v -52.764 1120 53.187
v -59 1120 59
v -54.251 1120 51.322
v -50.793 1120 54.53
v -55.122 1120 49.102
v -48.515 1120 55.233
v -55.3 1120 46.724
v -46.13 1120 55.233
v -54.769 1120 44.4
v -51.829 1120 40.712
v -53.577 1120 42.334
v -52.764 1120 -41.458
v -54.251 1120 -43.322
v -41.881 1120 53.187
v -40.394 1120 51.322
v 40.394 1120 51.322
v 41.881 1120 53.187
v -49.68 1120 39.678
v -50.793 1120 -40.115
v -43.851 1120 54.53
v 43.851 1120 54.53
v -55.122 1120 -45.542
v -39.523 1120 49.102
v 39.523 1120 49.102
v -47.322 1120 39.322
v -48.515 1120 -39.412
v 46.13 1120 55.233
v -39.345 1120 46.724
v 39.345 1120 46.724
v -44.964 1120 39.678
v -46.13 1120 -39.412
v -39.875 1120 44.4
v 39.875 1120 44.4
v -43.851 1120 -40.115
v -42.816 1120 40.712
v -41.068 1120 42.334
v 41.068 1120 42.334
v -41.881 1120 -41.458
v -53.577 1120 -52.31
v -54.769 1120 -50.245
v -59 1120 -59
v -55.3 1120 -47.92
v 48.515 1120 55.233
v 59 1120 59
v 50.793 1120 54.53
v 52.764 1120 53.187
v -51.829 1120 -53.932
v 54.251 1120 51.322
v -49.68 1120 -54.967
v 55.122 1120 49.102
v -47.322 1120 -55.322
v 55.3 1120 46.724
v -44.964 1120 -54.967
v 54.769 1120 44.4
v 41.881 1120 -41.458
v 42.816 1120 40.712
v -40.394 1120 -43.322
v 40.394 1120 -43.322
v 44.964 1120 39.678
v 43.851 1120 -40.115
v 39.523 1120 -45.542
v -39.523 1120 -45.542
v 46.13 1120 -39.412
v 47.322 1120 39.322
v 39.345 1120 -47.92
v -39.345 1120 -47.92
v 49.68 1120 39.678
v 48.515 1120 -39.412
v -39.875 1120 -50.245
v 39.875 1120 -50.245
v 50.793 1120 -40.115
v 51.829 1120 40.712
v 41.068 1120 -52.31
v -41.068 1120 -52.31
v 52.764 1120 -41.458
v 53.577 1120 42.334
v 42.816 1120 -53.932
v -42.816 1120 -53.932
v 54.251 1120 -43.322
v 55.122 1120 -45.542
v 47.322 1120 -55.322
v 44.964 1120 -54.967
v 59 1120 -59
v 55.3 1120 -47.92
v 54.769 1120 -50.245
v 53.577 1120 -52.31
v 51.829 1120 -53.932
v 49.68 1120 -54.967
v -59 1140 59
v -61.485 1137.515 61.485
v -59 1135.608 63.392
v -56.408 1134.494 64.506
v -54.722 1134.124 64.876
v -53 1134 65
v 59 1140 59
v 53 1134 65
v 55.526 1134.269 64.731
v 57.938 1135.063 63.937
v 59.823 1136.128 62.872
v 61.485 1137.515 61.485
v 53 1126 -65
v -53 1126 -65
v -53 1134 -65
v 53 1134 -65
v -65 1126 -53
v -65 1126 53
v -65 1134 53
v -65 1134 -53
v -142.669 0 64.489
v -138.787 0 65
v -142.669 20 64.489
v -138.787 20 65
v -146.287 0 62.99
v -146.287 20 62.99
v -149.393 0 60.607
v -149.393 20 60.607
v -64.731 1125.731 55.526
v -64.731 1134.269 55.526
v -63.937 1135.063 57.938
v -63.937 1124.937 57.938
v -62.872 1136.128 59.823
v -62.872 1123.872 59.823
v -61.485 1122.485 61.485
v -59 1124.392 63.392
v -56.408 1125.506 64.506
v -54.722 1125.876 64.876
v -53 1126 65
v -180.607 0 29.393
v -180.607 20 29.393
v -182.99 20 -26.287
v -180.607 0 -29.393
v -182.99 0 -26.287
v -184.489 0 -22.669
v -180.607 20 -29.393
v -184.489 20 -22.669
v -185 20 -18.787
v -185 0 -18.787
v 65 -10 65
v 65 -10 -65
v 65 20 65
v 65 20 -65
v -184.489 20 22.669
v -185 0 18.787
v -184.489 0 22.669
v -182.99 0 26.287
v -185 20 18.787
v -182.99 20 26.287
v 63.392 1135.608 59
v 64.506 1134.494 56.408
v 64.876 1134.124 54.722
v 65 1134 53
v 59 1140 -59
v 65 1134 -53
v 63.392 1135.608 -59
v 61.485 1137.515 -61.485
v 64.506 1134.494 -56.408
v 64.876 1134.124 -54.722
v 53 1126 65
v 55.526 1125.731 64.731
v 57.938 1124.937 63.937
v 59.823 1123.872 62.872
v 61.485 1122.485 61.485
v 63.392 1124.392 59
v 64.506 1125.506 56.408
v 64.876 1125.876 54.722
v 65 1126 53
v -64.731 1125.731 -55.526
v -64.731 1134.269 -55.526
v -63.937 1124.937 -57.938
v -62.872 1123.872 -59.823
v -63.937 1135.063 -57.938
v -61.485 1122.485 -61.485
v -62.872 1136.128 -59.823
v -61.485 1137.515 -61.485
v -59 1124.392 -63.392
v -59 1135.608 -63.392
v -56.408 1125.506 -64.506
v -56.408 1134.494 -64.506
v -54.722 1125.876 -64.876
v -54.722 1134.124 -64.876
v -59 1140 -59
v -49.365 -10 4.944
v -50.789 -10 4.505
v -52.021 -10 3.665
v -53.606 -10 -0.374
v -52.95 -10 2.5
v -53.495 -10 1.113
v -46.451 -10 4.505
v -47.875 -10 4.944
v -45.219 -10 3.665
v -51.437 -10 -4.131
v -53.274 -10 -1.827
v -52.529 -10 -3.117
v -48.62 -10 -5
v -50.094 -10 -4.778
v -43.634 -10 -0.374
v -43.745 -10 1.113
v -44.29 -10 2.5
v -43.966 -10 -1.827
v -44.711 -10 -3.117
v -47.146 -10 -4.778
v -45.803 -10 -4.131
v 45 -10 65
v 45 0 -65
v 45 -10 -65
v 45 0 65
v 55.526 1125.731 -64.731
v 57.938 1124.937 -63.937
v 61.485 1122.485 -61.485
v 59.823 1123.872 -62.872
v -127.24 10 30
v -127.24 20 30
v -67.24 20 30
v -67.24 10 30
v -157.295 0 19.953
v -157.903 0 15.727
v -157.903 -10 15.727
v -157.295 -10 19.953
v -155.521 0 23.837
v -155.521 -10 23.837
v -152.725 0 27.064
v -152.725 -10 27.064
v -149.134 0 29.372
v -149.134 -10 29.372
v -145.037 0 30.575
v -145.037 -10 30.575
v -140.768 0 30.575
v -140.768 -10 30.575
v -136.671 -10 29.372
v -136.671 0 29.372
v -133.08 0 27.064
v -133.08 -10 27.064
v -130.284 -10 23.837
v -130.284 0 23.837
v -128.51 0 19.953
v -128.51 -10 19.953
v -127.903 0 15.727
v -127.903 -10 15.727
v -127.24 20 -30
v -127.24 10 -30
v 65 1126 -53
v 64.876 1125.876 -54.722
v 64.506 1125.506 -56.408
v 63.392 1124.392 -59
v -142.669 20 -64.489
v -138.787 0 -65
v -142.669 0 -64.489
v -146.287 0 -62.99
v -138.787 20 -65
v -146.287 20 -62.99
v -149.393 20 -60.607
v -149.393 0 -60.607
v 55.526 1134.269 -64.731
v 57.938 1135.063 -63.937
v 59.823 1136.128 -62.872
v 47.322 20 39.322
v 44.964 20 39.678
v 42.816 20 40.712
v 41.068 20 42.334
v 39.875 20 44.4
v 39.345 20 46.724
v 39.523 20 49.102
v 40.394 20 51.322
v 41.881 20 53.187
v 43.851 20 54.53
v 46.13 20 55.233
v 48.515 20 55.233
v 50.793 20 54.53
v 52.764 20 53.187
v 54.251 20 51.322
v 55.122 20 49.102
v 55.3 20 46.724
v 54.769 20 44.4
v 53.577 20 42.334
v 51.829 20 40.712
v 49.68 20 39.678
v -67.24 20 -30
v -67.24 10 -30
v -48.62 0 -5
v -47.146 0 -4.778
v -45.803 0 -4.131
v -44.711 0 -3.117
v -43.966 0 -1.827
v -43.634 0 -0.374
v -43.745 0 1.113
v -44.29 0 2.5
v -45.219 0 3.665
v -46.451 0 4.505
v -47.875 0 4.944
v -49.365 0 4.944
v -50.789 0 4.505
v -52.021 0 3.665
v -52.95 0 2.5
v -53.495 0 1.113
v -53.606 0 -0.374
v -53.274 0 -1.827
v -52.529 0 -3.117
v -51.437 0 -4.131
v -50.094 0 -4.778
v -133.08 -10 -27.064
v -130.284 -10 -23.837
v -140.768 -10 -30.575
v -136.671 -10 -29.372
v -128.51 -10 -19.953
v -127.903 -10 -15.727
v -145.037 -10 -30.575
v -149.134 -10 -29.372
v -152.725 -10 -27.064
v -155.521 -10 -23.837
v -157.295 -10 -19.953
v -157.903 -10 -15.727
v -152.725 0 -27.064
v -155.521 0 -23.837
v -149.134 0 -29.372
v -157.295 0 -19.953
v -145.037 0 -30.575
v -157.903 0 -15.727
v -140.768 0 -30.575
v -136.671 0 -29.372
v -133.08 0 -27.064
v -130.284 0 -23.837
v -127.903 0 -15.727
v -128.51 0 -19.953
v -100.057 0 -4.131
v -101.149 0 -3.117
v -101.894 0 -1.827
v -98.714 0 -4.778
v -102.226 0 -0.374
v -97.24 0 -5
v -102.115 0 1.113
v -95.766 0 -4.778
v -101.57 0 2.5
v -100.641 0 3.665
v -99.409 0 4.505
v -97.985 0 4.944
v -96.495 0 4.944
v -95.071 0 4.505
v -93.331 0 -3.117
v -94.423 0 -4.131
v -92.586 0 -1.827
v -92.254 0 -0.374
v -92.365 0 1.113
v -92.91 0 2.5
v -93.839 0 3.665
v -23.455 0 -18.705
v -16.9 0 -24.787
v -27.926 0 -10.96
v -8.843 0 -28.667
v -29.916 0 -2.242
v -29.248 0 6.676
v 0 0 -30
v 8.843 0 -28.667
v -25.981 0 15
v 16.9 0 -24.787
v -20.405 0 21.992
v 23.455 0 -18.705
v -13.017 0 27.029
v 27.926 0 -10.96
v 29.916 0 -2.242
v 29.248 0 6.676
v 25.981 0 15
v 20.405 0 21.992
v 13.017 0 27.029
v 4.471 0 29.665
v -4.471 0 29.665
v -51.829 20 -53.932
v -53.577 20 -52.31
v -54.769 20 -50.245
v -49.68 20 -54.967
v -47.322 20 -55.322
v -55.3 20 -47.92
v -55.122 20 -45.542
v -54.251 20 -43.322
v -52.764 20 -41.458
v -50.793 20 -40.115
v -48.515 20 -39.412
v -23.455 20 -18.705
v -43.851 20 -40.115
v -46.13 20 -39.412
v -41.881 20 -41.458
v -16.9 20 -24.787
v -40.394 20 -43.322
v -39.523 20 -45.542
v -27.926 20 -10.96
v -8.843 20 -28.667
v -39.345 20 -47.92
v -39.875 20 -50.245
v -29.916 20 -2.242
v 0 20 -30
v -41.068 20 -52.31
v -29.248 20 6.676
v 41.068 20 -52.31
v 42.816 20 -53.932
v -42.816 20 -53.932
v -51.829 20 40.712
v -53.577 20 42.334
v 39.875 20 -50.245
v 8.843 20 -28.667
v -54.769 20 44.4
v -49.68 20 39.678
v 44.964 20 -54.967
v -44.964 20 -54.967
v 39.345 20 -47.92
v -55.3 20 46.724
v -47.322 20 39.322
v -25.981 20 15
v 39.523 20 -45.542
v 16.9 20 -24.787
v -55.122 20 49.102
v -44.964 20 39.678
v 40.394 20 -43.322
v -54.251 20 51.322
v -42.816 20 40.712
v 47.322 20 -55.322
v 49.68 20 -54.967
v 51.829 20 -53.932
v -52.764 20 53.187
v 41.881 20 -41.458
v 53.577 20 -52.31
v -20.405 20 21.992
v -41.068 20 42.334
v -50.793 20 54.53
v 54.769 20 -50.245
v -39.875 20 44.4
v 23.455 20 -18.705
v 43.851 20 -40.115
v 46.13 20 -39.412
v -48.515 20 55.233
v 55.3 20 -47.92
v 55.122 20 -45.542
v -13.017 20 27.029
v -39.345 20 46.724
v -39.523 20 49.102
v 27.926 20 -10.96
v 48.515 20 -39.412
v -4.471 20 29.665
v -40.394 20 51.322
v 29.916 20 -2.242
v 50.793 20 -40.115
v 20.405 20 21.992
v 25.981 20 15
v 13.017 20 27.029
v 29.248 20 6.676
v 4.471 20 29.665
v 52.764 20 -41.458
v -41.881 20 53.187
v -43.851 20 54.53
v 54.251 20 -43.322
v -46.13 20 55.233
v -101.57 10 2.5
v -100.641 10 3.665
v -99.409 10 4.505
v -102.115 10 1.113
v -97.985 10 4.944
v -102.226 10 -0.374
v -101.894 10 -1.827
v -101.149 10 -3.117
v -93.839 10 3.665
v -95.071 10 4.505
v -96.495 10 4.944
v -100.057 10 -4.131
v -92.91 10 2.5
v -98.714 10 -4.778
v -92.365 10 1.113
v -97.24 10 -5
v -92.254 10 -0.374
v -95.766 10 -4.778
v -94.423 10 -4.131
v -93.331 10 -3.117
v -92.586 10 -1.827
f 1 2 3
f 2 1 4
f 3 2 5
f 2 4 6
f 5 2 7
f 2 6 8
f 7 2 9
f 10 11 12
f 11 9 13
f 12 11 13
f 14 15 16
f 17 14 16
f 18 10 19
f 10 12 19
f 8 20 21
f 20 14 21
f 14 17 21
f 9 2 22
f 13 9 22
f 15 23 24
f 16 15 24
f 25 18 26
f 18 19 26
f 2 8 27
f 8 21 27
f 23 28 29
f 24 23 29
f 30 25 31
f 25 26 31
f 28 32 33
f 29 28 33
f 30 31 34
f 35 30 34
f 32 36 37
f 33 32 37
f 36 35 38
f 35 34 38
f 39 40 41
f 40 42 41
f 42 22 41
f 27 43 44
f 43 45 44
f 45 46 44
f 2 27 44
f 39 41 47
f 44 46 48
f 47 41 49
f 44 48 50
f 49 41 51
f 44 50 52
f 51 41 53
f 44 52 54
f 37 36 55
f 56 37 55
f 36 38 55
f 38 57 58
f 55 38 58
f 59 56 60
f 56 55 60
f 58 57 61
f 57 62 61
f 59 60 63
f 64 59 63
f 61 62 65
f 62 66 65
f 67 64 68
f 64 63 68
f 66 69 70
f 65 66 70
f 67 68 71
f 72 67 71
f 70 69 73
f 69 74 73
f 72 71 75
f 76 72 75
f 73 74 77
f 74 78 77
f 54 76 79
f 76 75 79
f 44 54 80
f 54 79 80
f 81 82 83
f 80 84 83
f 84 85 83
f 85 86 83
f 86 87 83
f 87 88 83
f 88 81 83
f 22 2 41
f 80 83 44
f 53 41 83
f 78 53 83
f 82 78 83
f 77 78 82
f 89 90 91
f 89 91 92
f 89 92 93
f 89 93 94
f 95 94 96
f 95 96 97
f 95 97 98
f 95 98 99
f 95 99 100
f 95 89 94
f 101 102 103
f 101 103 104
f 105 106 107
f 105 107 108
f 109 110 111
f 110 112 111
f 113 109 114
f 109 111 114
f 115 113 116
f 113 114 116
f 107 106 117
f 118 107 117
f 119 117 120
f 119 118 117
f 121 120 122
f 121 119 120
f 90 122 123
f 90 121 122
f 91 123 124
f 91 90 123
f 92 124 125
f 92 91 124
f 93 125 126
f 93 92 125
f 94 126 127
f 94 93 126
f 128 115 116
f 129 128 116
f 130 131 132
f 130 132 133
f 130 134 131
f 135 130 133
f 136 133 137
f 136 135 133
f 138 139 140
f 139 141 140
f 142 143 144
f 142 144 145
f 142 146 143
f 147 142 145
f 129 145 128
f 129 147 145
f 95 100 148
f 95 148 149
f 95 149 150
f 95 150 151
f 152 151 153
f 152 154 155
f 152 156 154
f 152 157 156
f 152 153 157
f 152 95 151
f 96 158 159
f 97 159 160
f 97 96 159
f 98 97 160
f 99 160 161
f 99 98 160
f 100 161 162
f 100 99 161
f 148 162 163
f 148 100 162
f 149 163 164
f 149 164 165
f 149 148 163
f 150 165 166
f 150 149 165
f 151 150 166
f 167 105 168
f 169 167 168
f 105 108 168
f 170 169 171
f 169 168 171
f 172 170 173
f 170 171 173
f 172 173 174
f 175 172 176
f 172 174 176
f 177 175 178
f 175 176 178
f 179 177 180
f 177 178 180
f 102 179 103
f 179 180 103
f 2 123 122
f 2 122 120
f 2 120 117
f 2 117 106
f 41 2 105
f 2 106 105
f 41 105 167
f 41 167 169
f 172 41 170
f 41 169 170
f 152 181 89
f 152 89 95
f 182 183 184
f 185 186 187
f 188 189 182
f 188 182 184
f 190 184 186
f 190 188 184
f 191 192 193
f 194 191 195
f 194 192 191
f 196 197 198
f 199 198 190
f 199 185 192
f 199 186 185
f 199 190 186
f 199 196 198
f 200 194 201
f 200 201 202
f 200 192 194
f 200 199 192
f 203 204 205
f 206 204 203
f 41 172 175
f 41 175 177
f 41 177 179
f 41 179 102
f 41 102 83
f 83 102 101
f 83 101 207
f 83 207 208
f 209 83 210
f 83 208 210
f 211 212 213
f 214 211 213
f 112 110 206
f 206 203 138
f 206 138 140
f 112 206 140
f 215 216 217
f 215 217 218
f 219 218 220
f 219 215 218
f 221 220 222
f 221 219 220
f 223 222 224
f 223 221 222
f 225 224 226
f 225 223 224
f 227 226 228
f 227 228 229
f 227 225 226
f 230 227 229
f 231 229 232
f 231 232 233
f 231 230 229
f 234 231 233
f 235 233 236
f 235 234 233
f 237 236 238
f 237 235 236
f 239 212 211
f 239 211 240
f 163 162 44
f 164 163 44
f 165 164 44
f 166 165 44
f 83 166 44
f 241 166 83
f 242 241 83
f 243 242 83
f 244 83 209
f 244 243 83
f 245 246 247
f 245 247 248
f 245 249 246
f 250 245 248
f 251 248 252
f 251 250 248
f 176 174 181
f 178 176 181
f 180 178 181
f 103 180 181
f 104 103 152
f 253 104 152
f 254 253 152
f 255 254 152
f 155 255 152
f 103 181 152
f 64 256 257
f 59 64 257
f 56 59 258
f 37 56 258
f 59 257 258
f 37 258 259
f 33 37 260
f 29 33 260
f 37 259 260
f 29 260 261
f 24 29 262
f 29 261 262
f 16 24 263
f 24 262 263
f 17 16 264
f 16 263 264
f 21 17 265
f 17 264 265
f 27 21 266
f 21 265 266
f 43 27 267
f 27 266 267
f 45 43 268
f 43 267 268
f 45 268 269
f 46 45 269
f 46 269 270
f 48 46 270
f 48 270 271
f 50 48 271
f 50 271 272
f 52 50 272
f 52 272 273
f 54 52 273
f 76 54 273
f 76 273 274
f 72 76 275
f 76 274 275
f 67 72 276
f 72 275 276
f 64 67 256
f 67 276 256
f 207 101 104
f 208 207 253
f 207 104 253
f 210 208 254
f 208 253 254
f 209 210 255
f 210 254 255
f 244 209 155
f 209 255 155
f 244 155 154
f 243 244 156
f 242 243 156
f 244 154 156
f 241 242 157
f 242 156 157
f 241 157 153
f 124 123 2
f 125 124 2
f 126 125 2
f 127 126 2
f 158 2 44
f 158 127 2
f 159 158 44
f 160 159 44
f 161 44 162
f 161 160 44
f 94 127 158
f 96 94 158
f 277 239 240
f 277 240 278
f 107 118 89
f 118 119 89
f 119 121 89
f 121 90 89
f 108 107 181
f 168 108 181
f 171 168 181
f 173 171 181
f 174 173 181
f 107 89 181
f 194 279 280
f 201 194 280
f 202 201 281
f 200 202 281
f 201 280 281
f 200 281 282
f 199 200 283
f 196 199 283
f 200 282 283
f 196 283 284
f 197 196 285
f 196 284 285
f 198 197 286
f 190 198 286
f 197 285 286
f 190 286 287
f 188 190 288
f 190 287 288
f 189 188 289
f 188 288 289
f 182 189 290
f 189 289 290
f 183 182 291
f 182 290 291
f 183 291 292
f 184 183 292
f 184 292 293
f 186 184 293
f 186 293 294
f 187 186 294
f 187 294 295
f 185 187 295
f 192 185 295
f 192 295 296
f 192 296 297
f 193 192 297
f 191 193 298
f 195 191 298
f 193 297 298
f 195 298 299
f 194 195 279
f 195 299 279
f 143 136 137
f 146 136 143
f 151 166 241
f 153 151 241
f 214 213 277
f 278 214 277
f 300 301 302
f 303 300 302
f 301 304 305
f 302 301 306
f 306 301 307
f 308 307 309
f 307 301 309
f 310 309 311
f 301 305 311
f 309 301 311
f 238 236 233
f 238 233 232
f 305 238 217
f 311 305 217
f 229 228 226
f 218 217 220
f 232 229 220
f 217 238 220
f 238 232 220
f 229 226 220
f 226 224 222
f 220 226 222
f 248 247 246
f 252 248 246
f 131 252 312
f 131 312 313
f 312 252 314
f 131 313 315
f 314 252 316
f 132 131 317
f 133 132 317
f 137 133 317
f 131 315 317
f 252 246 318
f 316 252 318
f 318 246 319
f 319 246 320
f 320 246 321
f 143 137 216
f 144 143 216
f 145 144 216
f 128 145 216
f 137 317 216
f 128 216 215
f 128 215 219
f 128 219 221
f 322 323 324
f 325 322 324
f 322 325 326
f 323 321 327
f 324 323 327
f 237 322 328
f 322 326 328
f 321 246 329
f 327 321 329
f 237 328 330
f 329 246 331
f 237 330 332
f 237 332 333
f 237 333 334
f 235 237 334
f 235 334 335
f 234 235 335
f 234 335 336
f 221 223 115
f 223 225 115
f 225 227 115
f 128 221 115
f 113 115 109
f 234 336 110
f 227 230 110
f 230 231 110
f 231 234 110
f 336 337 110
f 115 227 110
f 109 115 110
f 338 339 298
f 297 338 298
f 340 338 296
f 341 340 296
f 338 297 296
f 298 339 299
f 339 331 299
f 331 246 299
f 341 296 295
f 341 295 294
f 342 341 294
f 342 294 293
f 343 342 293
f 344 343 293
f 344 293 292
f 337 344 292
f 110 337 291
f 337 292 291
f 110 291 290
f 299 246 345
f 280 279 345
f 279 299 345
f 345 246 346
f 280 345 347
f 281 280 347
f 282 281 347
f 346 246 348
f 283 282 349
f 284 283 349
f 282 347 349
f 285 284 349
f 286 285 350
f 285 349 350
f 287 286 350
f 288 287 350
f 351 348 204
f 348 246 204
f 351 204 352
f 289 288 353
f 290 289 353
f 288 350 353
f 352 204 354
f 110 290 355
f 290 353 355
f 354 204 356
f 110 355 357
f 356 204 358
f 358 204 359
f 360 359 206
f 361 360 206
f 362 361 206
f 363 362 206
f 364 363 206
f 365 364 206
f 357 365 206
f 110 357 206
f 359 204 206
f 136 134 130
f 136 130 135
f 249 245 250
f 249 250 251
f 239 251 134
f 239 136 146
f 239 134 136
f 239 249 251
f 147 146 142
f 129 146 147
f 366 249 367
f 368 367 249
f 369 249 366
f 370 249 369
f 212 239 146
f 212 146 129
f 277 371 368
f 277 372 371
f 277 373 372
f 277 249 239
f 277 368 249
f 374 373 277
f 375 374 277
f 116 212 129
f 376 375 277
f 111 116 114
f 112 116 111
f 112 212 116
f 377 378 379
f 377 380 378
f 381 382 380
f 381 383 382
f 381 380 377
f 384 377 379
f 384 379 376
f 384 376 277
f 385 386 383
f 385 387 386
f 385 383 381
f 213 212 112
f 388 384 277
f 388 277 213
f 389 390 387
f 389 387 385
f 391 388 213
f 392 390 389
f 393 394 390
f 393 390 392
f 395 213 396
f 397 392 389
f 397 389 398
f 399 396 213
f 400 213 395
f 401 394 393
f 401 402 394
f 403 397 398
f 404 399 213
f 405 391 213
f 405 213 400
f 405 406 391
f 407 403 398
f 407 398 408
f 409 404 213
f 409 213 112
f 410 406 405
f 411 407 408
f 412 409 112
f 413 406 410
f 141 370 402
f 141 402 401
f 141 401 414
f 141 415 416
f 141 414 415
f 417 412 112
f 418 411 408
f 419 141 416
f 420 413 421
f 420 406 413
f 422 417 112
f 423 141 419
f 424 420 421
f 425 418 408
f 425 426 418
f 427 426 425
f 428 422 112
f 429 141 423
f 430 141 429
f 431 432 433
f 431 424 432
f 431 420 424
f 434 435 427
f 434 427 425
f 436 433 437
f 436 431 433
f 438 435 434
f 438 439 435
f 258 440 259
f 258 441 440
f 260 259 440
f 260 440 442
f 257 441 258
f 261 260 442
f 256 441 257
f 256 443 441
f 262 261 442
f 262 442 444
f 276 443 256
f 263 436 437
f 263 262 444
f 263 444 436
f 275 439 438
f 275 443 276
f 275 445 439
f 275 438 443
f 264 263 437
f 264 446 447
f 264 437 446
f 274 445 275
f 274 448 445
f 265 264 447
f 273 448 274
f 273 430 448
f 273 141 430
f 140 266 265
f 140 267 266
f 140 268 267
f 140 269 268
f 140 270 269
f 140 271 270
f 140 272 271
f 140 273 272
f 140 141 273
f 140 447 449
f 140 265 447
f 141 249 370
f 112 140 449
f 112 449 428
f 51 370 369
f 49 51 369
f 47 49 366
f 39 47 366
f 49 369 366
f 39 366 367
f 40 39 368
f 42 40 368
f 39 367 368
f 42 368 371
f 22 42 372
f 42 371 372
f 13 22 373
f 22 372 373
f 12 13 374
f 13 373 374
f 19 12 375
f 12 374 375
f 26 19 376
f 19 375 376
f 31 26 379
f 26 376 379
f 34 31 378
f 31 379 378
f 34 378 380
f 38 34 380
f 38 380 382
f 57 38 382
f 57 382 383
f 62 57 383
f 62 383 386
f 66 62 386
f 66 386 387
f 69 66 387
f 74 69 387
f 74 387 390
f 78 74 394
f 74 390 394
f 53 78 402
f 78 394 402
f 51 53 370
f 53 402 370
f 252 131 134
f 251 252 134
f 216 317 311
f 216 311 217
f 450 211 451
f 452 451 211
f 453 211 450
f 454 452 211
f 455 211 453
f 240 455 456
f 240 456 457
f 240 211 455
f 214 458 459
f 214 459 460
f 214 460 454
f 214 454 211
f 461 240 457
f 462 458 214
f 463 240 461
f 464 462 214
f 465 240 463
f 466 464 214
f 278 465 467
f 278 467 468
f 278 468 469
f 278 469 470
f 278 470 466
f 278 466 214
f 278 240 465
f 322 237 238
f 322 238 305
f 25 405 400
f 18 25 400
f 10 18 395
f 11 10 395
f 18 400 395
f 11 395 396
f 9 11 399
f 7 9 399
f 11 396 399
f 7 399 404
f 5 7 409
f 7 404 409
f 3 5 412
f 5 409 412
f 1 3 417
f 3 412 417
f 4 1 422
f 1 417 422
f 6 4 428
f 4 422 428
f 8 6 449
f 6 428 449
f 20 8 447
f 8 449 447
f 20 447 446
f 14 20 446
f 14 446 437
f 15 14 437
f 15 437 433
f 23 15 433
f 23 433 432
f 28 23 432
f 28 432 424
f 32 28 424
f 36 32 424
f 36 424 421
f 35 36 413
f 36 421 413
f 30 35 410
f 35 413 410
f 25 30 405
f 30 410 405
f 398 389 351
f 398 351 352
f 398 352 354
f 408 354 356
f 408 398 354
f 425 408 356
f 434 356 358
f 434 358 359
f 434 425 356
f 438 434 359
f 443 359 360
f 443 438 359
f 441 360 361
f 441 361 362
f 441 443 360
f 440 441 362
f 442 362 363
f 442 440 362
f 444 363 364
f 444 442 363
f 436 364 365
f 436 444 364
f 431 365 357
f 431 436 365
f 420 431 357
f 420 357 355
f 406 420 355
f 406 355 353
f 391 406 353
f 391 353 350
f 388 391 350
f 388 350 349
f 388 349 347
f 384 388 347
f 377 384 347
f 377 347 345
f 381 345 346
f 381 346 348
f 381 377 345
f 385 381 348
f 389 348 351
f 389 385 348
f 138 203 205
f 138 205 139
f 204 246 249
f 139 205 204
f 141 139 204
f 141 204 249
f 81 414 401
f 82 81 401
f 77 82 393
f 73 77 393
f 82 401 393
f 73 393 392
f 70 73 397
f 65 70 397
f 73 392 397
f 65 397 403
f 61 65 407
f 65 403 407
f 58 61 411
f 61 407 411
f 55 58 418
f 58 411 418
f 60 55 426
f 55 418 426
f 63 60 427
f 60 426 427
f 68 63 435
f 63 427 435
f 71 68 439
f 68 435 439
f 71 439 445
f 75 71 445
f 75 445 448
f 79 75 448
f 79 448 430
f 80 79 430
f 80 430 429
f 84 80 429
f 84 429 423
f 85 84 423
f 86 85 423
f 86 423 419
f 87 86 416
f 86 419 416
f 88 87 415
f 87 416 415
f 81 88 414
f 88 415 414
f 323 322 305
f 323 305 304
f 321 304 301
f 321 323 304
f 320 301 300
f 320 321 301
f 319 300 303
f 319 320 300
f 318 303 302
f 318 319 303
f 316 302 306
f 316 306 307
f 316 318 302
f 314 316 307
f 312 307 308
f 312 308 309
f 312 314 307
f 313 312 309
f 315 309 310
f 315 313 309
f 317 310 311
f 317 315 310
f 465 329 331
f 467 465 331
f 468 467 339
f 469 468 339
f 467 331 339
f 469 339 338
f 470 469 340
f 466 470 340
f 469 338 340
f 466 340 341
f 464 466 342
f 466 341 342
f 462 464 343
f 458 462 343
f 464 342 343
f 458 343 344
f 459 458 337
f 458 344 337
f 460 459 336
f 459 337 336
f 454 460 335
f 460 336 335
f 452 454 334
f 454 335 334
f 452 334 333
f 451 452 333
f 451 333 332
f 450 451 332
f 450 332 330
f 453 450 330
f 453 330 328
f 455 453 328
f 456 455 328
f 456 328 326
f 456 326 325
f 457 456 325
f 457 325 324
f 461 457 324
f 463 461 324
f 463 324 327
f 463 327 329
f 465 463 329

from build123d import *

# Parameters (mm, degrees)
SKETCH1_W            = 130
SKETCH1_H            = 130
BOSS_EXTRUDE2_DEPTH  = 20
SKETCH2_R            = 40
CUT_EXTRUDE1_DEPTH   = 95.074438611
SKETCH3_R            = 40
SKETCH3_R_2          = 30
BOSS_EXTRUDE3_DEPTH  = 20
SKETCH4_W            = 125.450553561
SKETCH4_H            = 31.465087356
CUT_EXTRUDE2_DEPTH   = 151.748134317
BOSS_EXTRUDE4_START  = -20
SKETCH5_R            = 40
SKETCH5_R_2          = 30
BOSS_EXTRUDE4_DEPTH  = 20
SKETCH6_R            = 8
BOSS_EXTRUDE5_DEPTH  = 1100
SKETCH7_W            = 130
SKETCH7_H            = 130
BOSS_EXTRUDE6_DEPTH  = 20
SKETCH8_W            = 20
SKETCH8_H            = 130
BOSS_EXTRUDE7_DEPTH  = 10
SKETCH9_W            = 130
SKETCH9_H            = 20
BOSS_EXTRUDE8_DEPTH  = 120
SKETCH10_R           = 5
BOSS_EXTRUDE9_DEPTH  = 10
SKETCH11_R           = 5
CUT_EXTRUDE3_DEPTH   = 1157.741111917
SKETCH12_W           = 60
SKETCH12_H           = 60
CUT_EXTRUDE4_DEPTH   = 10
CHAMFER1_SIZE        = 40
FILLET1_R            = 15
BOSS_EXTRUDE10_DEPTH = 10
CHAMFER2_SIZE        = 6
FILLET2_R            = 12


with BuildPart() as part:
    # Sketch1 → Boss-Extrude2 (new body)
    with BuildSketch(Plane(origin=(0, 0, 0), x_dir=(1, 0, 0), z_dir=(0, 1, 0))):
        Rectangle(SKETCH1_W, SKETCH1_H)
    extrude(amount=BOSS_EXTRUDE2_DEPTH)

    # Sketch2 → Cut-Extrude1 (cut, through all)
    with BuildSketch(Plane(origin=(0, 20, 0), x_dir=(1, 0, 0), z_dir=(0, 1, 0))):
        with Locations(Location((0, 0, 0), (0, 0, 270))):
            Circle(SKETCH2_R)
    extrude(amount=-CUT_EXTRUDE1_DEPTH, mode=Mode.SUBTRACT)

    # Sketch5 → Boss-Extrude4 (add)
    with BuildSketch(Plane.XZ.offset(BOSS_EXTRUDE4_START)):
        Circle(SKETCH5_R)
        with Locations(Location((0, 0, 0), (0, 0, 270))):
            Circle(SKETCH5_R_2, mode=Mode.SUBTRACT)
    extrude(amount=BOSS_EXTRUDE4_DEPTH)

    # Sketch6 → Boss-Extrude5 (add)
    with BuildSketch(Plane(origin=(0, 20, 0), x_dir=(1, 0, 0), z_dir=(0, 1, 0))):
        with Locations(Location((-47.32233047, 47.32233047, 0), (0, 0, 90))):
            Circle(SKETCH6_R)
        with Locations(Location((47.32233047, 47.32233047, 0), (0, 0, 90))):
            Circle(SKETCH6_R)
        with Locations(Location((47.32233047, -47.32233047, 0), (0, 0, 90))):
            Circle(SKETCH6_R)
        with Locations(Location((-47.32233047, -47.32233047, 0), (0, 0, 90))):
            Circle(SKETCH6_R)
    extrude(amount=BOSS_EXTRUDE5_DEPTH)

    # Sketch7 → Boss-Extrude6 (add)
    with BuildSketch(Plane(origin=(0, 1120, 0), x_dir=(1, 0, 0), z_dir=(0, 1, 0))):
        Rectangle(SKETCH7_W, SKETCH7_H)
    extrude(amount=BOSS_EXTRUDE6_DEPTH)

    # Sketch8 → Boss-Extrude7 (add)
    with BuildSketch(Plane.XZ):
        with Locations((55, 0)):
            Rectangle(SKETCH8_W, SKETCH8_H)
    extrude(amount=BOSS_EXTRUDE7_DEPTH)

    # Sketch9 → Boss-Extrude8 (add)
    with BuildSketch(Plane.ZY.offset(65)):
        with Locations((0, 10)):
            Rectangle(SKETCH9_W, SKETCH9_H)
    extrude(amount=BOSS_EXTRUDE8_DEPTH)

    # Sketch10 → Boss-Extrude9 (add)
    with BuildSketch(Plane.XZ):
        with Locations(Location((-48.62, 0, 0), (0, 0, 270))):
            Circle(SKETCH10_R)
    extrude(amount=BOSS_EXTRUDE9_DEPTH)

    # Sketch11 → Cut-Extrude3 (cut, through all)
    with BuildSketch(Plane.XZ):
        with Locations(Location((-97.24, 0, 0), (0, 0, 270))):
            Circle(SKETCH11_R)
    extrude(amount=-CUT_EXTRUDE3_DEPTH, mode=Mode.SUBTRACT)

    # Sketch12 → Cut-Extrude4 (cut)
    with BuildSketch(Plane(origin=(0, 20, 0), x_dir=(1, 0, 0), z_dir=(0, 1, 0))):
        with Locations((-97.24, 0)):
            Rectangle(SKETCH12_W, SKETCH12_H)
    extrude(amount=-CUT_EXTRUDE4_DEPTH, mode=Mode.SUBTRACT)

    # Chamfer1
    chamfer1_edges = [part.edges().sort_by_distance(p)[0] for p in [
        (-185, 10, -65),
        (-185, 10, 65),
    ]]
    chamfer(chamfer1_edges, length=CHAMFER1_SIZE)

    # Fillet1
    fillet1_edges = [part.edges().sort_by_distance(p)[0] for p in [
        (-185, 10, 25),
        (-185, 10, -25),
        (-145, 10, -65),
        (-145, 10, 65),
    ]]
    fillet(fillet1_edges, radius=FILLET1_R)

    # Sketch13 → Boss-Extrude10 (add)
    with BuildSketch(Plane.XZ):
        with BuildLine():
            Line((-157.902531243, -15.727314256), (-157.902531243, 15.727314256))
            ThreePointArc((-157.902531243, 15.727314256), (-142.902531243, 30.727314256), (-127.902531243, 15.727314256))
            Line((-127.902531243, 15.727314256), (-127.902531243, -15.727314256))
            ThreePointArc((-127.902531243, -15.727314256), (-142.902531243, -30.727314256), (-157.902531243, -15.727314256))
        make_face()
    extrude(amount=BOSS_EXTRUDE10_DEPTH)

    # Chamfer2
    chamfer2_edges = [part.edges().sort_by_distance(p)[0] for p in [
        (-65, 1120, 0),
        (0, 1120, 65),
        (65, 1120, 0),
        (0, 1120, -65),
        (-65, 1140, 0),
        (0, 1140, 65),
        (65, 1140, 0),
        (0, 1140, -65),
    ]]
    chamfer(chamfer2_edges, length=CHAMFER2_SIZE)

    # Fillet2
    fillet2_edges = [part.edges().sort_by_distance(p)[0] for p in [
        (-65, 1130, -65),
        (65, 1130, -65),
        (65, 1130, 65),
        (-65, 1130, 65),
    ]]
    fillet(fillet2_edges, radius=FILLET2_R)


with BuildPart() as body_2:
    # Sketch3 → Boss-Extrude3 (new body)
    with BuildSketch(Plane(origin=(0, 20, 0), x_dir=(1, 0, 0), z_dir=(0, 1, 0))):
        with Locations(Location((0, 0, 0), (0, 0, 270))):
            Circle(SKETCH3_R)
        with Locations(Location((0, 0, 0), (0, 0, 270))):
            Circle(SKETCH3_R_2, mode=Mode.SUBTRACT)
    extrude(amount=BOSS_EXTRUDE3_DEPTH)

    # Sketch4 → Cut-Extrude2 (cut, through all)
    with BuildSketch(Plane.XY.offset(65)):
        with Locations((-2.274723219, 35.732543678)):
            Rectangle(SKETCH4_W, SKETCH4_H)
    extrude(amount=-CUT_EXTRUDE2_DEPTH, mode=Mode.SUBTRACT)


solid = part.part
